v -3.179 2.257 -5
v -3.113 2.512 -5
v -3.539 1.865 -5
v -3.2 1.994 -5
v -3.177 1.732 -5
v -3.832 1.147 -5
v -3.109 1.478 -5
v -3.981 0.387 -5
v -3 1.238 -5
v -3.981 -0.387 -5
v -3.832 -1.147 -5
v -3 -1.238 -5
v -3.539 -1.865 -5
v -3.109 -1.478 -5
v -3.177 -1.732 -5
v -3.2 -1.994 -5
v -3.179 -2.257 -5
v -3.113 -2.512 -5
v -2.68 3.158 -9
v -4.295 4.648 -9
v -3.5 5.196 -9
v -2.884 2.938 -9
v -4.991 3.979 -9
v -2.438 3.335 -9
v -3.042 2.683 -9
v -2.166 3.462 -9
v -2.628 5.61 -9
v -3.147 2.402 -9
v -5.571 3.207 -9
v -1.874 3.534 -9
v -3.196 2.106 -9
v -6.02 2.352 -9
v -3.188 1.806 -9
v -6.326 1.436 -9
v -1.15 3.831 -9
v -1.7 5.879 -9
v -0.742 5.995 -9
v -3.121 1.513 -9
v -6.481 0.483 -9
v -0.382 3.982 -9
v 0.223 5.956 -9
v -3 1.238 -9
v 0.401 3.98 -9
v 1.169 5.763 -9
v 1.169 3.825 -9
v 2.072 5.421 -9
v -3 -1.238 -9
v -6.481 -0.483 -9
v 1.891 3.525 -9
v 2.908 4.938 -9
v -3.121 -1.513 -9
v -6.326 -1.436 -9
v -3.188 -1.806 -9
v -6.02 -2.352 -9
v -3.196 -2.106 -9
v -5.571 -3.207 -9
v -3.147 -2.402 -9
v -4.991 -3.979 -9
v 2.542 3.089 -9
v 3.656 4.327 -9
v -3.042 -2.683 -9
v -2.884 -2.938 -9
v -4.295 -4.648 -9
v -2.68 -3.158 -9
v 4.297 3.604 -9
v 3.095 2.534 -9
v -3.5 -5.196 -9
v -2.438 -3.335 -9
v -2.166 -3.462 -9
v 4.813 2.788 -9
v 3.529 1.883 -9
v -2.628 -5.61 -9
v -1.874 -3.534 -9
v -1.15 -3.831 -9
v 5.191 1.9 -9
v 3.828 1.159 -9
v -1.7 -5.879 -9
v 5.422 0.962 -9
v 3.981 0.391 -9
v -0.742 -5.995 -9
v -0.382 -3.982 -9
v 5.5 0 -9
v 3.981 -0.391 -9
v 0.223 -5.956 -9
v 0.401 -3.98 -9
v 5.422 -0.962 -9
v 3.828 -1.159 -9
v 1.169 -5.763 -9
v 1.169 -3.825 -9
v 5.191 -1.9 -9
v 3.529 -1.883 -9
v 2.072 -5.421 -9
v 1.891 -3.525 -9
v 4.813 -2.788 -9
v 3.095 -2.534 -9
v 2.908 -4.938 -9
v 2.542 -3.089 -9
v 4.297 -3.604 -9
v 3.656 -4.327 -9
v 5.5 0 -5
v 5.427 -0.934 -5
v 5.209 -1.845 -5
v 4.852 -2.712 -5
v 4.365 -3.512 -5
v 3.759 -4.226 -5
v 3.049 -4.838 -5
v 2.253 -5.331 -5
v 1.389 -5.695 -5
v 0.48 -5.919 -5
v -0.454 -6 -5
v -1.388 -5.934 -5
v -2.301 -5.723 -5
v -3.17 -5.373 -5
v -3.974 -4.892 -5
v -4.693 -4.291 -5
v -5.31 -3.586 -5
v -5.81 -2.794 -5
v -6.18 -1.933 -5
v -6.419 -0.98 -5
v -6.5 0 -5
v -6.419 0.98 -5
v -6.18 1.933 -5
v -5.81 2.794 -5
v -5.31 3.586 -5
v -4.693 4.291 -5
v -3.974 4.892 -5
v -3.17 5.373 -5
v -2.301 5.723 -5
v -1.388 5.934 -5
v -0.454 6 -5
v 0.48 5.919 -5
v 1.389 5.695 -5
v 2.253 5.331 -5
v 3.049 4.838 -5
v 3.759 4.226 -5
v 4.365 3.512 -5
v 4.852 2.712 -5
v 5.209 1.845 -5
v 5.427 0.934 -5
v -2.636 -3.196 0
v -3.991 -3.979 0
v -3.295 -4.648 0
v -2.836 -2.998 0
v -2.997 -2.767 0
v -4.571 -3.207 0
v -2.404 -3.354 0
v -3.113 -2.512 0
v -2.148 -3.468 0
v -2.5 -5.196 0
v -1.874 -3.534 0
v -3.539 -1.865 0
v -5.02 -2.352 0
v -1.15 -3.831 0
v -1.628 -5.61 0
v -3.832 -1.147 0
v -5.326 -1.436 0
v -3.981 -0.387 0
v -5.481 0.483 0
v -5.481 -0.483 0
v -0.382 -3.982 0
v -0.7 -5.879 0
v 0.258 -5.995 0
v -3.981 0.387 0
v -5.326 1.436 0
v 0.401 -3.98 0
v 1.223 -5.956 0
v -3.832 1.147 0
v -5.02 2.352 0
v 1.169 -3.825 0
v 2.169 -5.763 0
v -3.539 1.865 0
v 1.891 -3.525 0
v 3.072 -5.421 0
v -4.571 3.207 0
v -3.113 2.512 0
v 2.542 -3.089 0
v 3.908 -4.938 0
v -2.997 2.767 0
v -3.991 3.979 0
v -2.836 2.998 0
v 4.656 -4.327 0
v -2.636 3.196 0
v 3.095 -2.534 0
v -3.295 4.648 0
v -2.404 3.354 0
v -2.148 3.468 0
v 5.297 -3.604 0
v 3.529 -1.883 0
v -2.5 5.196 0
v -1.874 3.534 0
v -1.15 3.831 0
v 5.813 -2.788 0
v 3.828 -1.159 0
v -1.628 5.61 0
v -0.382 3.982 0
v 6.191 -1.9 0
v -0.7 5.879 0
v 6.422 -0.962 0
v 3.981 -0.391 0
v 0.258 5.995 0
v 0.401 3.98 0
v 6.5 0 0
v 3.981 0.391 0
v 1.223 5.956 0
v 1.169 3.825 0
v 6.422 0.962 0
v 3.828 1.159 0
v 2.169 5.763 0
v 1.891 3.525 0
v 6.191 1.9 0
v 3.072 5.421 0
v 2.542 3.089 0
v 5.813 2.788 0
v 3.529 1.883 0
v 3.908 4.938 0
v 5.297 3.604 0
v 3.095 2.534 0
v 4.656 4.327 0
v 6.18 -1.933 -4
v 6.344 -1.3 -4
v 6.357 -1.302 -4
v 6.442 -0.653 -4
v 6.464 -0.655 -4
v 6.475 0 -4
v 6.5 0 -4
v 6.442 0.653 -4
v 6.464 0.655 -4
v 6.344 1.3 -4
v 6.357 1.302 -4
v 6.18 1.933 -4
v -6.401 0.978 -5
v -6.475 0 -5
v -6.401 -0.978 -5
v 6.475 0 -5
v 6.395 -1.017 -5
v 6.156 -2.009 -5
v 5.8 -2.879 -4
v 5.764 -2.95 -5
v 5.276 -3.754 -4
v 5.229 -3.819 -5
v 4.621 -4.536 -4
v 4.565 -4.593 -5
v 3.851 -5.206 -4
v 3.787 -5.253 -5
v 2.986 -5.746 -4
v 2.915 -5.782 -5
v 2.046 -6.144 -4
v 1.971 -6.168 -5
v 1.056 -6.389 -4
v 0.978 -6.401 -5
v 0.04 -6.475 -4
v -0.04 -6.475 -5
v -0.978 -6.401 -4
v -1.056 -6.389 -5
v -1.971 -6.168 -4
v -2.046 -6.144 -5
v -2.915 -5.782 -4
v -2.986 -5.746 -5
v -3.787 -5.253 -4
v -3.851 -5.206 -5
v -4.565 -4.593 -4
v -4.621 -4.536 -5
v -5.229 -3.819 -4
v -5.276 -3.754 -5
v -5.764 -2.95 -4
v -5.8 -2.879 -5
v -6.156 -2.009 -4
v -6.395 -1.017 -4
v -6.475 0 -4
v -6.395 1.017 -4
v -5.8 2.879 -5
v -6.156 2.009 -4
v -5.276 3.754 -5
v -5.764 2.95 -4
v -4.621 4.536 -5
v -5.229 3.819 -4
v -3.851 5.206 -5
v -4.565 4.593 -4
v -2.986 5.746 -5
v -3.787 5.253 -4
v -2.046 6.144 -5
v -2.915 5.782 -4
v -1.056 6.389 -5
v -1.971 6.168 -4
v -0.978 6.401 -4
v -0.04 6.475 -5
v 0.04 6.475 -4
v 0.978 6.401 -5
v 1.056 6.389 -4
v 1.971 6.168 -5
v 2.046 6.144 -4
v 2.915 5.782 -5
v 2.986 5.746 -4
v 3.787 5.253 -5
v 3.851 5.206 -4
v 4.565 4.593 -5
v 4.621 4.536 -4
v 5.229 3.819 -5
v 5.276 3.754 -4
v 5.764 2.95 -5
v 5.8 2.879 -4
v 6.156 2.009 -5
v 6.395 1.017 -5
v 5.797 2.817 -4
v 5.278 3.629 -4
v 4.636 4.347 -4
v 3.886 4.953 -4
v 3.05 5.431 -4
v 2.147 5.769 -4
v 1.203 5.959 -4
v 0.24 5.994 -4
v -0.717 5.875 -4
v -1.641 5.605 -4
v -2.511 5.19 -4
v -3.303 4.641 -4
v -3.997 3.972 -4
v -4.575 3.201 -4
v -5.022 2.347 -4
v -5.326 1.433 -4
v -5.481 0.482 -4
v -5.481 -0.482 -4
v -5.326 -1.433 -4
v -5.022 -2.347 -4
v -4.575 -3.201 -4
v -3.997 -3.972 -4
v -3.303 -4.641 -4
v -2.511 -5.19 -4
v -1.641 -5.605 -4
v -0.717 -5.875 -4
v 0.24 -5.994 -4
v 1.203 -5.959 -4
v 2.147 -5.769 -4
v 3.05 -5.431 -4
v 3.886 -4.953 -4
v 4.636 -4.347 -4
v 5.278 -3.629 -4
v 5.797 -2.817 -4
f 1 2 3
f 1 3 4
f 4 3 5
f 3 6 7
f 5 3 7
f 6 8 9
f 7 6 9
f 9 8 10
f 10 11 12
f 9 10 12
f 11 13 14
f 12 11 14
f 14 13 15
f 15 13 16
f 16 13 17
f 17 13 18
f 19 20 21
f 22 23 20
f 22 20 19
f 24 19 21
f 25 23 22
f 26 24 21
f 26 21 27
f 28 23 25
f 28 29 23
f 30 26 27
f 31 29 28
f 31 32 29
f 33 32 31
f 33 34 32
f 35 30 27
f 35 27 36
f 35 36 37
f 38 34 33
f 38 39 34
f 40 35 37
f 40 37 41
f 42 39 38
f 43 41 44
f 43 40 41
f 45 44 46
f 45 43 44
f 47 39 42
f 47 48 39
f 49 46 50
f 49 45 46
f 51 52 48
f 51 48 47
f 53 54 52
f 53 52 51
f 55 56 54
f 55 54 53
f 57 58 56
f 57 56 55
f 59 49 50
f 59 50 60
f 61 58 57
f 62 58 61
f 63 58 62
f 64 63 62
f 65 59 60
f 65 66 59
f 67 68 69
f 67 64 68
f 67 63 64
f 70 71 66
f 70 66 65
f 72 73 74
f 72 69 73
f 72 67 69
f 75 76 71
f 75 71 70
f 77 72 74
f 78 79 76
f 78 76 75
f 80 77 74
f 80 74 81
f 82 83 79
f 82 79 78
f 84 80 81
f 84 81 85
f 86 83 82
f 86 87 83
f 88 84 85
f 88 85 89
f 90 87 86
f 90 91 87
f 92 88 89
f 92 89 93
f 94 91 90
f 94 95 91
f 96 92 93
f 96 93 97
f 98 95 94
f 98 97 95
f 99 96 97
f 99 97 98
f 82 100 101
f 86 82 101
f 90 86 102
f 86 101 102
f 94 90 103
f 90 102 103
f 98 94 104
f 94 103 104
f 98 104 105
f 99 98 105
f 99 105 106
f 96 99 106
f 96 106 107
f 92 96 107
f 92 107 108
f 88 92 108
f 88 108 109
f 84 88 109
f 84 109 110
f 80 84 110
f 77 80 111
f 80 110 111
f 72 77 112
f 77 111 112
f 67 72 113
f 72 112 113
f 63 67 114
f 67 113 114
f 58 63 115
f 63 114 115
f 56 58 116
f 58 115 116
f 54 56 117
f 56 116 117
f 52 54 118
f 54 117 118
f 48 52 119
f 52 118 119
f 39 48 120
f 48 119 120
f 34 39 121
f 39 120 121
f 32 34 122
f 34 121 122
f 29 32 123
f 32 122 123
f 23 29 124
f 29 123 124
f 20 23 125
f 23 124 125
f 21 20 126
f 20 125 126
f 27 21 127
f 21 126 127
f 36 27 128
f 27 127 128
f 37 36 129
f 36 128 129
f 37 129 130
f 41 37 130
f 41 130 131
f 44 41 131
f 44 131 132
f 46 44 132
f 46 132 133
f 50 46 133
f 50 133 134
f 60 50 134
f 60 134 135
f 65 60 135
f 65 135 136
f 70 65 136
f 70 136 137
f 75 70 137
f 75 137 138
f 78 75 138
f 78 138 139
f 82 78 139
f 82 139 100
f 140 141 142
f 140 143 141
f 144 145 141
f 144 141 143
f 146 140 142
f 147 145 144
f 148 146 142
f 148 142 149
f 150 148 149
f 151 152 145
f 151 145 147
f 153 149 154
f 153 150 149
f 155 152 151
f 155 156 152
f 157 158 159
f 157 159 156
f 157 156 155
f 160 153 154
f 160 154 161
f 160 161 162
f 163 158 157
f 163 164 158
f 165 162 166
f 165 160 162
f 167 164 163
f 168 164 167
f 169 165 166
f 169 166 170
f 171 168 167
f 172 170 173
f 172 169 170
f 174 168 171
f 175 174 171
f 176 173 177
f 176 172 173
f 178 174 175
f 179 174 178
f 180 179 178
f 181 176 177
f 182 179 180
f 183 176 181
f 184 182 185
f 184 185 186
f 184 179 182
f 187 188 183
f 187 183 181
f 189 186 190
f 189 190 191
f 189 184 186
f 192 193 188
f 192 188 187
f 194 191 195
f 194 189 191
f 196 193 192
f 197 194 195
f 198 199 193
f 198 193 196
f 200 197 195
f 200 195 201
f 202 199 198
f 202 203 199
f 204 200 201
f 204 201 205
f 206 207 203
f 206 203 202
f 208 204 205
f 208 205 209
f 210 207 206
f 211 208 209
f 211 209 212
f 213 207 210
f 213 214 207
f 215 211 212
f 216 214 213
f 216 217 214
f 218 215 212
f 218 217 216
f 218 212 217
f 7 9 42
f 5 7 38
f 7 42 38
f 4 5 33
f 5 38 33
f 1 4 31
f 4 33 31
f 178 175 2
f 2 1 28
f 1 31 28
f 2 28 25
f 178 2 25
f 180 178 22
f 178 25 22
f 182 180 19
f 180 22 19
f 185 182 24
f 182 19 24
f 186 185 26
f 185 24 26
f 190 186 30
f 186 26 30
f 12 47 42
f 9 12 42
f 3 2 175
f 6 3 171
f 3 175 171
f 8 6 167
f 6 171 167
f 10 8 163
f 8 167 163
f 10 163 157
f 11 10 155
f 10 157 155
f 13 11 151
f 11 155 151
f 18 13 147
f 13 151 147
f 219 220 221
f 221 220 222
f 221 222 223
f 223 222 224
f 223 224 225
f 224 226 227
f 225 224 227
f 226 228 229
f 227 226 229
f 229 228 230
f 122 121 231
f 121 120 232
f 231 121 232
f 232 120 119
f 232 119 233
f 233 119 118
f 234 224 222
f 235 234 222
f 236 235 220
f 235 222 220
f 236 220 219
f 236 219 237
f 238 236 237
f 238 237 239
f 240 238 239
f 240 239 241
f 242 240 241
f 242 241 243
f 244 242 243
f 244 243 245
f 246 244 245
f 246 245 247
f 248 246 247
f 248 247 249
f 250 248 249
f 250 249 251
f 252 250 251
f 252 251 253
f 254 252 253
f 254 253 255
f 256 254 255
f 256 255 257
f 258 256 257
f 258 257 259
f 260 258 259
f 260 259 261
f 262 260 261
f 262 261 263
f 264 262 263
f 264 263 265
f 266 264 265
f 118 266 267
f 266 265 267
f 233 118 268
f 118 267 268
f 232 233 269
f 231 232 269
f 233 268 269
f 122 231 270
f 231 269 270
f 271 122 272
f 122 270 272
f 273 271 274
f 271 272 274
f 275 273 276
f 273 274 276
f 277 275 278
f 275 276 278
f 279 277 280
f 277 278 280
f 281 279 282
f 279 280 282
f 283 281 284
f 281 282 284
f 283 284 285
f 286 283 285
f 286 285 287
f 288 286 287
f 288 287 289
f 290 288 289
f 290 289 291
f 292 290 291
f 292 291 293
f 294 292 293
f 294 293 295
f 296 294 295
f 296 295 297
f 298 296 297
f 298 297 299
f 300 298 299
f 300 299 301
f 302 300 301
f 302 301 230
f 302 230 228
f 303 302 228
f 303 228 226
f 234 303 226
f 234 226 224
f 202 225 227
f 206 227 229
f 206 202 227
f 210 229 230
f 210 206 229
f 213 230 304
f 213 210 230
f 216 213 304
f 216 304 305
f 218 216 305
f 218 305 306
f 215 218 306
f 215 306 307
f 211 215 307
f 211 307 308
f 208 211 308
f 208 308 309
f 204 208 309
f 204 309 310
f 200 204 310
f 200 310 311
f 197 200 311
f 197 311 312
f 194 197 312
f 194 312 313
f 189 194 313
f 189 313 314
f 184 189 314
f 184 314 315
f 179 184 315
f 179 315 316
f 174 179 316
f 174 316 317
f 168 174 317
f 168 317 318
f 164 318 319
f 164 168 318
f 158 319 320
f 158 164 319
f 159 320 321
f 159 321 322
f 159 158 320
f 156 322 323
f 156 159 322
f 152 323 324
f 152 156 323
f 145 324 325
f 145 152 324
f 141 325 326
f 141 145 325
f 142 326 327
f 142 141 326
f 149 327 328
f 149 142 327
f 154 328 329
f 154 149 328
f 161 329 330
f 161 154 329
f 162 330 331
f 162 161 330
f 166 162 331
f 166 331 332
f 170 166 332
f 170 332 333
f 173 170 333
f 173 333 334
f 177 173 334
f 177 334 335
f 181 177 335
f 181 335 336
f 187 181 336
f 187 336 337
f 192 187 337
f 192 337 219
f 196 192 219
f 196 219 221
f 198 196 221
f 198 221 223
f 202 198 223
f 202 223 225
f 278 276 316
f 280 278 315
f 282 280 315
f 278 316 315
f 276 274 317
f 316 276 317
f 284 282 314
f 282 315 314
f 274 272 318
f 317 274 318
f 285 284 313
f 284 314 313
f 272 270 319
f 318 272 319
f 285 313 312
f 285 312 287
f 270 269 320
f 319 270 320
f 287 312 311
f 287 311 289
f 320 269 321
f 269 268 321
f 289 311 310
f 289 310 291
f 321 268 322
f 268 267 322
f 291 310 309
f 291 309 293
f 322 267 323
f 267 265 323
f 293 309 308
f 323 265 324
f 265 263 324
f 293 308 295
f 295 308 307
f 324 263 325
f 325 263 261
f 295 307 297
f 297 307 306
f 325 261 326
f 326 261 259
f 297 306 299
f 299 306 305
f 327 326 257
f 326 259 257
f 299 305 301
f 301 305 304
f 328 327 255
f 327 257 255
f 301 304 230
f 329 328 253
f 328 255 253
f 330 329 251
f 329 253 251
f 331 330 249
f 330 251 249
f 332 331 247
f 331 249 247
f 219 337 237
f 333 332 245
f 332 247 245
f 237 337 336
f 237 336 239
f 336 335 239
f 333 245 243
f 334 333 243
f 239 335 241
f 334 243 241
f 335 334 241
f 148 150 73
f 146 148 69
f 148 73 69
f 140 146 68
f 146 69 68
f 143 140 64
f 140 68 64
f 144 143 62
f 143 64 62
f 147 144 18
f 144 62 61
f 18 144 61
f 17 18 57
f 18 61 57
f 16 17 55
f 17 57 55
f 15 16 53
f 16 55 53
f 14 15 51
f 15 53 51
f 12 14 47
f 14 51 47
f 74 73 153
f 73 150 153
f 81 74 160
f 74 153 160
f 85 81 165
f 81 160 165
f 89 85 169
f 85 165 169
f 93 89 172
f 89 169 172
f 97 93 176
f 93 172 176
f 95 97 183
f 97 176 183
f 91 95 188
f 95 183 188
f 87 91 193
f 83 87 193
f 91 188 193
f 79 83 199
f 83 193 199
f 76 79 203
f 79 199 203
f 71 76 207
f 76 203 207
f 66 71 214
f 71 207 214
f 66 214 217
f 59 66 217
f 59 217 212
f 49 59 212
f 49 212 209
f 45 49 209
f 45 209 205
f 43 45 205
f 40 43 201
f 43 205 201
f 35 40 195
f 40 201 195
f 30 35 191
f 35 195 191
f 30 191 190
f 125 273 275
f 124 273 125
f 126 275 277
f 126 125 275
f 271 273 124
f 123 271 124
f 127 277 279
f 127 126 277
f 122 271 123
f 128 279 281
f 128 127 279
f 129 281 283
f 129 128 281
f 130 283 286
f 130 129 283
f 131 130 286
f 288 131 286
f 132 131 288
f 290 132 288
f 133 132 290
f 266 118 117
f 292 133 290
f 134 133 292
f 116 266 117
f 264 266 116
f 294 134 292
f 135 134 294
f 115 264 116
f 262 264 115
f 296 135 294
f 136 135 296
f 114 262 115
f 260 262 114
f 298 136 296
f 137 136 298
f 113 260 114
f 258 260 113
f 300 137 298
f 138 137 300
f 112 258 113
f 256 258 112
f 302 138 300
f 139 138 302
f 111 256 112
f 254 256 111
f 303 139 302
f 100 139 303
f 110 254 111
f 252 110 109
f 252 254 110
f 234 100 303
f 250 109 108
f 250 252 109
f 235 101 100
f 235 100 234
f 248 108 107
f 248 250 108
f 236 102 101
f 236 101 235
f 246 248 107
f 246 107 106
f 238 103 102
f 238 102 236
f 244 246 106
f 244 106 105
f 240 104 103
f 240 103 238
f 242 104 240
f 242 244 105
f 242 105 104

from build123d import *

# Parameters (mm, degrees)
SKETCH_R        = 6
PAD_DEPTH       = 4
SKETCH001_R     = 6.47535
PAD001_DEPTH    = 1
SKETCH002_R     = 6
PAD002_DEPTH    = 4
SKETCH003_R     = 4
POCKET_DEPTH    = 9.001
PAD003_DEPTH    = 4
SKETCH005_R     = 1.55
POCKET001_DEPTH = 9.001


with BuildPart() as part:
    # Sketch → Pad (new body)
    with BuildSketch(Plane.XY):
        with Locations((0.5, 0)):
            Circle(SKETCH_R)
    extrude(amount=-PAD_DEPTH)

    # Sketch001 (on Face3 of Pad) → Pad001 (join)
    with BuildSketch(Plane(origin=(0, 0, -4), x_dir=(1, 0, 0), z_dir=(0, 0, -1))):
        Circle(SKETCH001_R)
    extrude(amount=PAD001_DEPTH)

    # Sketch002 (on Face6 of Pad001) → Pad002 (join)
    with BuildSketch(Plane(origin=(0, 0, -5), x_dir=(1, 0, 0), z_dir=(0, 0, -1))):
        with Locations((-0.5, 0)):
            Circle(SKETCH002_R)
    extrude(amount=PAD002_DEPTH)

    # Sketch003 (on Face2 of Pad002) → Pocket (cut, through all)
    with BuildSketch(Plane.XY):
        Circle(SKETCH003_R)
    extrude(amount=-POCKET_DEPTH, mode=Mode.SUBTRACT)

    # Sketch004 (on Face7 of Pocket) → Pad003 (join)
    with BuildSketch(Plane(origin=(0, 0, -9), x_dir=(1, 0, 0), z_dir=(0, 0, -1))):
        with BuildLine():
            ThreePointArc((-3, 2.645751), (-4, 0), (-3, -2.645751))
            Line((-3, 2.645751), (-3, -2.645751))
        make_face()
    extrude(amount=-PAD003_DEPTH)

    # Sketch005 (on Face7 of Pad003) → Pocket001 (cut, through all)
    with BuildSketch(Plane(origin=(0, 0, -9), x_dir=(1, 0, 0), z_dir=(0, 0, -1))):
        with Locations((-1.65, 2)):
            Circle(SKETCH005_R)
        with Locations((-1.65, -2)):
            Circle(SKETCH005_R)
    extrude(amount=-POCKET001_DEPTH, mode=Mode.SUBTRACT)


solid = part.part
